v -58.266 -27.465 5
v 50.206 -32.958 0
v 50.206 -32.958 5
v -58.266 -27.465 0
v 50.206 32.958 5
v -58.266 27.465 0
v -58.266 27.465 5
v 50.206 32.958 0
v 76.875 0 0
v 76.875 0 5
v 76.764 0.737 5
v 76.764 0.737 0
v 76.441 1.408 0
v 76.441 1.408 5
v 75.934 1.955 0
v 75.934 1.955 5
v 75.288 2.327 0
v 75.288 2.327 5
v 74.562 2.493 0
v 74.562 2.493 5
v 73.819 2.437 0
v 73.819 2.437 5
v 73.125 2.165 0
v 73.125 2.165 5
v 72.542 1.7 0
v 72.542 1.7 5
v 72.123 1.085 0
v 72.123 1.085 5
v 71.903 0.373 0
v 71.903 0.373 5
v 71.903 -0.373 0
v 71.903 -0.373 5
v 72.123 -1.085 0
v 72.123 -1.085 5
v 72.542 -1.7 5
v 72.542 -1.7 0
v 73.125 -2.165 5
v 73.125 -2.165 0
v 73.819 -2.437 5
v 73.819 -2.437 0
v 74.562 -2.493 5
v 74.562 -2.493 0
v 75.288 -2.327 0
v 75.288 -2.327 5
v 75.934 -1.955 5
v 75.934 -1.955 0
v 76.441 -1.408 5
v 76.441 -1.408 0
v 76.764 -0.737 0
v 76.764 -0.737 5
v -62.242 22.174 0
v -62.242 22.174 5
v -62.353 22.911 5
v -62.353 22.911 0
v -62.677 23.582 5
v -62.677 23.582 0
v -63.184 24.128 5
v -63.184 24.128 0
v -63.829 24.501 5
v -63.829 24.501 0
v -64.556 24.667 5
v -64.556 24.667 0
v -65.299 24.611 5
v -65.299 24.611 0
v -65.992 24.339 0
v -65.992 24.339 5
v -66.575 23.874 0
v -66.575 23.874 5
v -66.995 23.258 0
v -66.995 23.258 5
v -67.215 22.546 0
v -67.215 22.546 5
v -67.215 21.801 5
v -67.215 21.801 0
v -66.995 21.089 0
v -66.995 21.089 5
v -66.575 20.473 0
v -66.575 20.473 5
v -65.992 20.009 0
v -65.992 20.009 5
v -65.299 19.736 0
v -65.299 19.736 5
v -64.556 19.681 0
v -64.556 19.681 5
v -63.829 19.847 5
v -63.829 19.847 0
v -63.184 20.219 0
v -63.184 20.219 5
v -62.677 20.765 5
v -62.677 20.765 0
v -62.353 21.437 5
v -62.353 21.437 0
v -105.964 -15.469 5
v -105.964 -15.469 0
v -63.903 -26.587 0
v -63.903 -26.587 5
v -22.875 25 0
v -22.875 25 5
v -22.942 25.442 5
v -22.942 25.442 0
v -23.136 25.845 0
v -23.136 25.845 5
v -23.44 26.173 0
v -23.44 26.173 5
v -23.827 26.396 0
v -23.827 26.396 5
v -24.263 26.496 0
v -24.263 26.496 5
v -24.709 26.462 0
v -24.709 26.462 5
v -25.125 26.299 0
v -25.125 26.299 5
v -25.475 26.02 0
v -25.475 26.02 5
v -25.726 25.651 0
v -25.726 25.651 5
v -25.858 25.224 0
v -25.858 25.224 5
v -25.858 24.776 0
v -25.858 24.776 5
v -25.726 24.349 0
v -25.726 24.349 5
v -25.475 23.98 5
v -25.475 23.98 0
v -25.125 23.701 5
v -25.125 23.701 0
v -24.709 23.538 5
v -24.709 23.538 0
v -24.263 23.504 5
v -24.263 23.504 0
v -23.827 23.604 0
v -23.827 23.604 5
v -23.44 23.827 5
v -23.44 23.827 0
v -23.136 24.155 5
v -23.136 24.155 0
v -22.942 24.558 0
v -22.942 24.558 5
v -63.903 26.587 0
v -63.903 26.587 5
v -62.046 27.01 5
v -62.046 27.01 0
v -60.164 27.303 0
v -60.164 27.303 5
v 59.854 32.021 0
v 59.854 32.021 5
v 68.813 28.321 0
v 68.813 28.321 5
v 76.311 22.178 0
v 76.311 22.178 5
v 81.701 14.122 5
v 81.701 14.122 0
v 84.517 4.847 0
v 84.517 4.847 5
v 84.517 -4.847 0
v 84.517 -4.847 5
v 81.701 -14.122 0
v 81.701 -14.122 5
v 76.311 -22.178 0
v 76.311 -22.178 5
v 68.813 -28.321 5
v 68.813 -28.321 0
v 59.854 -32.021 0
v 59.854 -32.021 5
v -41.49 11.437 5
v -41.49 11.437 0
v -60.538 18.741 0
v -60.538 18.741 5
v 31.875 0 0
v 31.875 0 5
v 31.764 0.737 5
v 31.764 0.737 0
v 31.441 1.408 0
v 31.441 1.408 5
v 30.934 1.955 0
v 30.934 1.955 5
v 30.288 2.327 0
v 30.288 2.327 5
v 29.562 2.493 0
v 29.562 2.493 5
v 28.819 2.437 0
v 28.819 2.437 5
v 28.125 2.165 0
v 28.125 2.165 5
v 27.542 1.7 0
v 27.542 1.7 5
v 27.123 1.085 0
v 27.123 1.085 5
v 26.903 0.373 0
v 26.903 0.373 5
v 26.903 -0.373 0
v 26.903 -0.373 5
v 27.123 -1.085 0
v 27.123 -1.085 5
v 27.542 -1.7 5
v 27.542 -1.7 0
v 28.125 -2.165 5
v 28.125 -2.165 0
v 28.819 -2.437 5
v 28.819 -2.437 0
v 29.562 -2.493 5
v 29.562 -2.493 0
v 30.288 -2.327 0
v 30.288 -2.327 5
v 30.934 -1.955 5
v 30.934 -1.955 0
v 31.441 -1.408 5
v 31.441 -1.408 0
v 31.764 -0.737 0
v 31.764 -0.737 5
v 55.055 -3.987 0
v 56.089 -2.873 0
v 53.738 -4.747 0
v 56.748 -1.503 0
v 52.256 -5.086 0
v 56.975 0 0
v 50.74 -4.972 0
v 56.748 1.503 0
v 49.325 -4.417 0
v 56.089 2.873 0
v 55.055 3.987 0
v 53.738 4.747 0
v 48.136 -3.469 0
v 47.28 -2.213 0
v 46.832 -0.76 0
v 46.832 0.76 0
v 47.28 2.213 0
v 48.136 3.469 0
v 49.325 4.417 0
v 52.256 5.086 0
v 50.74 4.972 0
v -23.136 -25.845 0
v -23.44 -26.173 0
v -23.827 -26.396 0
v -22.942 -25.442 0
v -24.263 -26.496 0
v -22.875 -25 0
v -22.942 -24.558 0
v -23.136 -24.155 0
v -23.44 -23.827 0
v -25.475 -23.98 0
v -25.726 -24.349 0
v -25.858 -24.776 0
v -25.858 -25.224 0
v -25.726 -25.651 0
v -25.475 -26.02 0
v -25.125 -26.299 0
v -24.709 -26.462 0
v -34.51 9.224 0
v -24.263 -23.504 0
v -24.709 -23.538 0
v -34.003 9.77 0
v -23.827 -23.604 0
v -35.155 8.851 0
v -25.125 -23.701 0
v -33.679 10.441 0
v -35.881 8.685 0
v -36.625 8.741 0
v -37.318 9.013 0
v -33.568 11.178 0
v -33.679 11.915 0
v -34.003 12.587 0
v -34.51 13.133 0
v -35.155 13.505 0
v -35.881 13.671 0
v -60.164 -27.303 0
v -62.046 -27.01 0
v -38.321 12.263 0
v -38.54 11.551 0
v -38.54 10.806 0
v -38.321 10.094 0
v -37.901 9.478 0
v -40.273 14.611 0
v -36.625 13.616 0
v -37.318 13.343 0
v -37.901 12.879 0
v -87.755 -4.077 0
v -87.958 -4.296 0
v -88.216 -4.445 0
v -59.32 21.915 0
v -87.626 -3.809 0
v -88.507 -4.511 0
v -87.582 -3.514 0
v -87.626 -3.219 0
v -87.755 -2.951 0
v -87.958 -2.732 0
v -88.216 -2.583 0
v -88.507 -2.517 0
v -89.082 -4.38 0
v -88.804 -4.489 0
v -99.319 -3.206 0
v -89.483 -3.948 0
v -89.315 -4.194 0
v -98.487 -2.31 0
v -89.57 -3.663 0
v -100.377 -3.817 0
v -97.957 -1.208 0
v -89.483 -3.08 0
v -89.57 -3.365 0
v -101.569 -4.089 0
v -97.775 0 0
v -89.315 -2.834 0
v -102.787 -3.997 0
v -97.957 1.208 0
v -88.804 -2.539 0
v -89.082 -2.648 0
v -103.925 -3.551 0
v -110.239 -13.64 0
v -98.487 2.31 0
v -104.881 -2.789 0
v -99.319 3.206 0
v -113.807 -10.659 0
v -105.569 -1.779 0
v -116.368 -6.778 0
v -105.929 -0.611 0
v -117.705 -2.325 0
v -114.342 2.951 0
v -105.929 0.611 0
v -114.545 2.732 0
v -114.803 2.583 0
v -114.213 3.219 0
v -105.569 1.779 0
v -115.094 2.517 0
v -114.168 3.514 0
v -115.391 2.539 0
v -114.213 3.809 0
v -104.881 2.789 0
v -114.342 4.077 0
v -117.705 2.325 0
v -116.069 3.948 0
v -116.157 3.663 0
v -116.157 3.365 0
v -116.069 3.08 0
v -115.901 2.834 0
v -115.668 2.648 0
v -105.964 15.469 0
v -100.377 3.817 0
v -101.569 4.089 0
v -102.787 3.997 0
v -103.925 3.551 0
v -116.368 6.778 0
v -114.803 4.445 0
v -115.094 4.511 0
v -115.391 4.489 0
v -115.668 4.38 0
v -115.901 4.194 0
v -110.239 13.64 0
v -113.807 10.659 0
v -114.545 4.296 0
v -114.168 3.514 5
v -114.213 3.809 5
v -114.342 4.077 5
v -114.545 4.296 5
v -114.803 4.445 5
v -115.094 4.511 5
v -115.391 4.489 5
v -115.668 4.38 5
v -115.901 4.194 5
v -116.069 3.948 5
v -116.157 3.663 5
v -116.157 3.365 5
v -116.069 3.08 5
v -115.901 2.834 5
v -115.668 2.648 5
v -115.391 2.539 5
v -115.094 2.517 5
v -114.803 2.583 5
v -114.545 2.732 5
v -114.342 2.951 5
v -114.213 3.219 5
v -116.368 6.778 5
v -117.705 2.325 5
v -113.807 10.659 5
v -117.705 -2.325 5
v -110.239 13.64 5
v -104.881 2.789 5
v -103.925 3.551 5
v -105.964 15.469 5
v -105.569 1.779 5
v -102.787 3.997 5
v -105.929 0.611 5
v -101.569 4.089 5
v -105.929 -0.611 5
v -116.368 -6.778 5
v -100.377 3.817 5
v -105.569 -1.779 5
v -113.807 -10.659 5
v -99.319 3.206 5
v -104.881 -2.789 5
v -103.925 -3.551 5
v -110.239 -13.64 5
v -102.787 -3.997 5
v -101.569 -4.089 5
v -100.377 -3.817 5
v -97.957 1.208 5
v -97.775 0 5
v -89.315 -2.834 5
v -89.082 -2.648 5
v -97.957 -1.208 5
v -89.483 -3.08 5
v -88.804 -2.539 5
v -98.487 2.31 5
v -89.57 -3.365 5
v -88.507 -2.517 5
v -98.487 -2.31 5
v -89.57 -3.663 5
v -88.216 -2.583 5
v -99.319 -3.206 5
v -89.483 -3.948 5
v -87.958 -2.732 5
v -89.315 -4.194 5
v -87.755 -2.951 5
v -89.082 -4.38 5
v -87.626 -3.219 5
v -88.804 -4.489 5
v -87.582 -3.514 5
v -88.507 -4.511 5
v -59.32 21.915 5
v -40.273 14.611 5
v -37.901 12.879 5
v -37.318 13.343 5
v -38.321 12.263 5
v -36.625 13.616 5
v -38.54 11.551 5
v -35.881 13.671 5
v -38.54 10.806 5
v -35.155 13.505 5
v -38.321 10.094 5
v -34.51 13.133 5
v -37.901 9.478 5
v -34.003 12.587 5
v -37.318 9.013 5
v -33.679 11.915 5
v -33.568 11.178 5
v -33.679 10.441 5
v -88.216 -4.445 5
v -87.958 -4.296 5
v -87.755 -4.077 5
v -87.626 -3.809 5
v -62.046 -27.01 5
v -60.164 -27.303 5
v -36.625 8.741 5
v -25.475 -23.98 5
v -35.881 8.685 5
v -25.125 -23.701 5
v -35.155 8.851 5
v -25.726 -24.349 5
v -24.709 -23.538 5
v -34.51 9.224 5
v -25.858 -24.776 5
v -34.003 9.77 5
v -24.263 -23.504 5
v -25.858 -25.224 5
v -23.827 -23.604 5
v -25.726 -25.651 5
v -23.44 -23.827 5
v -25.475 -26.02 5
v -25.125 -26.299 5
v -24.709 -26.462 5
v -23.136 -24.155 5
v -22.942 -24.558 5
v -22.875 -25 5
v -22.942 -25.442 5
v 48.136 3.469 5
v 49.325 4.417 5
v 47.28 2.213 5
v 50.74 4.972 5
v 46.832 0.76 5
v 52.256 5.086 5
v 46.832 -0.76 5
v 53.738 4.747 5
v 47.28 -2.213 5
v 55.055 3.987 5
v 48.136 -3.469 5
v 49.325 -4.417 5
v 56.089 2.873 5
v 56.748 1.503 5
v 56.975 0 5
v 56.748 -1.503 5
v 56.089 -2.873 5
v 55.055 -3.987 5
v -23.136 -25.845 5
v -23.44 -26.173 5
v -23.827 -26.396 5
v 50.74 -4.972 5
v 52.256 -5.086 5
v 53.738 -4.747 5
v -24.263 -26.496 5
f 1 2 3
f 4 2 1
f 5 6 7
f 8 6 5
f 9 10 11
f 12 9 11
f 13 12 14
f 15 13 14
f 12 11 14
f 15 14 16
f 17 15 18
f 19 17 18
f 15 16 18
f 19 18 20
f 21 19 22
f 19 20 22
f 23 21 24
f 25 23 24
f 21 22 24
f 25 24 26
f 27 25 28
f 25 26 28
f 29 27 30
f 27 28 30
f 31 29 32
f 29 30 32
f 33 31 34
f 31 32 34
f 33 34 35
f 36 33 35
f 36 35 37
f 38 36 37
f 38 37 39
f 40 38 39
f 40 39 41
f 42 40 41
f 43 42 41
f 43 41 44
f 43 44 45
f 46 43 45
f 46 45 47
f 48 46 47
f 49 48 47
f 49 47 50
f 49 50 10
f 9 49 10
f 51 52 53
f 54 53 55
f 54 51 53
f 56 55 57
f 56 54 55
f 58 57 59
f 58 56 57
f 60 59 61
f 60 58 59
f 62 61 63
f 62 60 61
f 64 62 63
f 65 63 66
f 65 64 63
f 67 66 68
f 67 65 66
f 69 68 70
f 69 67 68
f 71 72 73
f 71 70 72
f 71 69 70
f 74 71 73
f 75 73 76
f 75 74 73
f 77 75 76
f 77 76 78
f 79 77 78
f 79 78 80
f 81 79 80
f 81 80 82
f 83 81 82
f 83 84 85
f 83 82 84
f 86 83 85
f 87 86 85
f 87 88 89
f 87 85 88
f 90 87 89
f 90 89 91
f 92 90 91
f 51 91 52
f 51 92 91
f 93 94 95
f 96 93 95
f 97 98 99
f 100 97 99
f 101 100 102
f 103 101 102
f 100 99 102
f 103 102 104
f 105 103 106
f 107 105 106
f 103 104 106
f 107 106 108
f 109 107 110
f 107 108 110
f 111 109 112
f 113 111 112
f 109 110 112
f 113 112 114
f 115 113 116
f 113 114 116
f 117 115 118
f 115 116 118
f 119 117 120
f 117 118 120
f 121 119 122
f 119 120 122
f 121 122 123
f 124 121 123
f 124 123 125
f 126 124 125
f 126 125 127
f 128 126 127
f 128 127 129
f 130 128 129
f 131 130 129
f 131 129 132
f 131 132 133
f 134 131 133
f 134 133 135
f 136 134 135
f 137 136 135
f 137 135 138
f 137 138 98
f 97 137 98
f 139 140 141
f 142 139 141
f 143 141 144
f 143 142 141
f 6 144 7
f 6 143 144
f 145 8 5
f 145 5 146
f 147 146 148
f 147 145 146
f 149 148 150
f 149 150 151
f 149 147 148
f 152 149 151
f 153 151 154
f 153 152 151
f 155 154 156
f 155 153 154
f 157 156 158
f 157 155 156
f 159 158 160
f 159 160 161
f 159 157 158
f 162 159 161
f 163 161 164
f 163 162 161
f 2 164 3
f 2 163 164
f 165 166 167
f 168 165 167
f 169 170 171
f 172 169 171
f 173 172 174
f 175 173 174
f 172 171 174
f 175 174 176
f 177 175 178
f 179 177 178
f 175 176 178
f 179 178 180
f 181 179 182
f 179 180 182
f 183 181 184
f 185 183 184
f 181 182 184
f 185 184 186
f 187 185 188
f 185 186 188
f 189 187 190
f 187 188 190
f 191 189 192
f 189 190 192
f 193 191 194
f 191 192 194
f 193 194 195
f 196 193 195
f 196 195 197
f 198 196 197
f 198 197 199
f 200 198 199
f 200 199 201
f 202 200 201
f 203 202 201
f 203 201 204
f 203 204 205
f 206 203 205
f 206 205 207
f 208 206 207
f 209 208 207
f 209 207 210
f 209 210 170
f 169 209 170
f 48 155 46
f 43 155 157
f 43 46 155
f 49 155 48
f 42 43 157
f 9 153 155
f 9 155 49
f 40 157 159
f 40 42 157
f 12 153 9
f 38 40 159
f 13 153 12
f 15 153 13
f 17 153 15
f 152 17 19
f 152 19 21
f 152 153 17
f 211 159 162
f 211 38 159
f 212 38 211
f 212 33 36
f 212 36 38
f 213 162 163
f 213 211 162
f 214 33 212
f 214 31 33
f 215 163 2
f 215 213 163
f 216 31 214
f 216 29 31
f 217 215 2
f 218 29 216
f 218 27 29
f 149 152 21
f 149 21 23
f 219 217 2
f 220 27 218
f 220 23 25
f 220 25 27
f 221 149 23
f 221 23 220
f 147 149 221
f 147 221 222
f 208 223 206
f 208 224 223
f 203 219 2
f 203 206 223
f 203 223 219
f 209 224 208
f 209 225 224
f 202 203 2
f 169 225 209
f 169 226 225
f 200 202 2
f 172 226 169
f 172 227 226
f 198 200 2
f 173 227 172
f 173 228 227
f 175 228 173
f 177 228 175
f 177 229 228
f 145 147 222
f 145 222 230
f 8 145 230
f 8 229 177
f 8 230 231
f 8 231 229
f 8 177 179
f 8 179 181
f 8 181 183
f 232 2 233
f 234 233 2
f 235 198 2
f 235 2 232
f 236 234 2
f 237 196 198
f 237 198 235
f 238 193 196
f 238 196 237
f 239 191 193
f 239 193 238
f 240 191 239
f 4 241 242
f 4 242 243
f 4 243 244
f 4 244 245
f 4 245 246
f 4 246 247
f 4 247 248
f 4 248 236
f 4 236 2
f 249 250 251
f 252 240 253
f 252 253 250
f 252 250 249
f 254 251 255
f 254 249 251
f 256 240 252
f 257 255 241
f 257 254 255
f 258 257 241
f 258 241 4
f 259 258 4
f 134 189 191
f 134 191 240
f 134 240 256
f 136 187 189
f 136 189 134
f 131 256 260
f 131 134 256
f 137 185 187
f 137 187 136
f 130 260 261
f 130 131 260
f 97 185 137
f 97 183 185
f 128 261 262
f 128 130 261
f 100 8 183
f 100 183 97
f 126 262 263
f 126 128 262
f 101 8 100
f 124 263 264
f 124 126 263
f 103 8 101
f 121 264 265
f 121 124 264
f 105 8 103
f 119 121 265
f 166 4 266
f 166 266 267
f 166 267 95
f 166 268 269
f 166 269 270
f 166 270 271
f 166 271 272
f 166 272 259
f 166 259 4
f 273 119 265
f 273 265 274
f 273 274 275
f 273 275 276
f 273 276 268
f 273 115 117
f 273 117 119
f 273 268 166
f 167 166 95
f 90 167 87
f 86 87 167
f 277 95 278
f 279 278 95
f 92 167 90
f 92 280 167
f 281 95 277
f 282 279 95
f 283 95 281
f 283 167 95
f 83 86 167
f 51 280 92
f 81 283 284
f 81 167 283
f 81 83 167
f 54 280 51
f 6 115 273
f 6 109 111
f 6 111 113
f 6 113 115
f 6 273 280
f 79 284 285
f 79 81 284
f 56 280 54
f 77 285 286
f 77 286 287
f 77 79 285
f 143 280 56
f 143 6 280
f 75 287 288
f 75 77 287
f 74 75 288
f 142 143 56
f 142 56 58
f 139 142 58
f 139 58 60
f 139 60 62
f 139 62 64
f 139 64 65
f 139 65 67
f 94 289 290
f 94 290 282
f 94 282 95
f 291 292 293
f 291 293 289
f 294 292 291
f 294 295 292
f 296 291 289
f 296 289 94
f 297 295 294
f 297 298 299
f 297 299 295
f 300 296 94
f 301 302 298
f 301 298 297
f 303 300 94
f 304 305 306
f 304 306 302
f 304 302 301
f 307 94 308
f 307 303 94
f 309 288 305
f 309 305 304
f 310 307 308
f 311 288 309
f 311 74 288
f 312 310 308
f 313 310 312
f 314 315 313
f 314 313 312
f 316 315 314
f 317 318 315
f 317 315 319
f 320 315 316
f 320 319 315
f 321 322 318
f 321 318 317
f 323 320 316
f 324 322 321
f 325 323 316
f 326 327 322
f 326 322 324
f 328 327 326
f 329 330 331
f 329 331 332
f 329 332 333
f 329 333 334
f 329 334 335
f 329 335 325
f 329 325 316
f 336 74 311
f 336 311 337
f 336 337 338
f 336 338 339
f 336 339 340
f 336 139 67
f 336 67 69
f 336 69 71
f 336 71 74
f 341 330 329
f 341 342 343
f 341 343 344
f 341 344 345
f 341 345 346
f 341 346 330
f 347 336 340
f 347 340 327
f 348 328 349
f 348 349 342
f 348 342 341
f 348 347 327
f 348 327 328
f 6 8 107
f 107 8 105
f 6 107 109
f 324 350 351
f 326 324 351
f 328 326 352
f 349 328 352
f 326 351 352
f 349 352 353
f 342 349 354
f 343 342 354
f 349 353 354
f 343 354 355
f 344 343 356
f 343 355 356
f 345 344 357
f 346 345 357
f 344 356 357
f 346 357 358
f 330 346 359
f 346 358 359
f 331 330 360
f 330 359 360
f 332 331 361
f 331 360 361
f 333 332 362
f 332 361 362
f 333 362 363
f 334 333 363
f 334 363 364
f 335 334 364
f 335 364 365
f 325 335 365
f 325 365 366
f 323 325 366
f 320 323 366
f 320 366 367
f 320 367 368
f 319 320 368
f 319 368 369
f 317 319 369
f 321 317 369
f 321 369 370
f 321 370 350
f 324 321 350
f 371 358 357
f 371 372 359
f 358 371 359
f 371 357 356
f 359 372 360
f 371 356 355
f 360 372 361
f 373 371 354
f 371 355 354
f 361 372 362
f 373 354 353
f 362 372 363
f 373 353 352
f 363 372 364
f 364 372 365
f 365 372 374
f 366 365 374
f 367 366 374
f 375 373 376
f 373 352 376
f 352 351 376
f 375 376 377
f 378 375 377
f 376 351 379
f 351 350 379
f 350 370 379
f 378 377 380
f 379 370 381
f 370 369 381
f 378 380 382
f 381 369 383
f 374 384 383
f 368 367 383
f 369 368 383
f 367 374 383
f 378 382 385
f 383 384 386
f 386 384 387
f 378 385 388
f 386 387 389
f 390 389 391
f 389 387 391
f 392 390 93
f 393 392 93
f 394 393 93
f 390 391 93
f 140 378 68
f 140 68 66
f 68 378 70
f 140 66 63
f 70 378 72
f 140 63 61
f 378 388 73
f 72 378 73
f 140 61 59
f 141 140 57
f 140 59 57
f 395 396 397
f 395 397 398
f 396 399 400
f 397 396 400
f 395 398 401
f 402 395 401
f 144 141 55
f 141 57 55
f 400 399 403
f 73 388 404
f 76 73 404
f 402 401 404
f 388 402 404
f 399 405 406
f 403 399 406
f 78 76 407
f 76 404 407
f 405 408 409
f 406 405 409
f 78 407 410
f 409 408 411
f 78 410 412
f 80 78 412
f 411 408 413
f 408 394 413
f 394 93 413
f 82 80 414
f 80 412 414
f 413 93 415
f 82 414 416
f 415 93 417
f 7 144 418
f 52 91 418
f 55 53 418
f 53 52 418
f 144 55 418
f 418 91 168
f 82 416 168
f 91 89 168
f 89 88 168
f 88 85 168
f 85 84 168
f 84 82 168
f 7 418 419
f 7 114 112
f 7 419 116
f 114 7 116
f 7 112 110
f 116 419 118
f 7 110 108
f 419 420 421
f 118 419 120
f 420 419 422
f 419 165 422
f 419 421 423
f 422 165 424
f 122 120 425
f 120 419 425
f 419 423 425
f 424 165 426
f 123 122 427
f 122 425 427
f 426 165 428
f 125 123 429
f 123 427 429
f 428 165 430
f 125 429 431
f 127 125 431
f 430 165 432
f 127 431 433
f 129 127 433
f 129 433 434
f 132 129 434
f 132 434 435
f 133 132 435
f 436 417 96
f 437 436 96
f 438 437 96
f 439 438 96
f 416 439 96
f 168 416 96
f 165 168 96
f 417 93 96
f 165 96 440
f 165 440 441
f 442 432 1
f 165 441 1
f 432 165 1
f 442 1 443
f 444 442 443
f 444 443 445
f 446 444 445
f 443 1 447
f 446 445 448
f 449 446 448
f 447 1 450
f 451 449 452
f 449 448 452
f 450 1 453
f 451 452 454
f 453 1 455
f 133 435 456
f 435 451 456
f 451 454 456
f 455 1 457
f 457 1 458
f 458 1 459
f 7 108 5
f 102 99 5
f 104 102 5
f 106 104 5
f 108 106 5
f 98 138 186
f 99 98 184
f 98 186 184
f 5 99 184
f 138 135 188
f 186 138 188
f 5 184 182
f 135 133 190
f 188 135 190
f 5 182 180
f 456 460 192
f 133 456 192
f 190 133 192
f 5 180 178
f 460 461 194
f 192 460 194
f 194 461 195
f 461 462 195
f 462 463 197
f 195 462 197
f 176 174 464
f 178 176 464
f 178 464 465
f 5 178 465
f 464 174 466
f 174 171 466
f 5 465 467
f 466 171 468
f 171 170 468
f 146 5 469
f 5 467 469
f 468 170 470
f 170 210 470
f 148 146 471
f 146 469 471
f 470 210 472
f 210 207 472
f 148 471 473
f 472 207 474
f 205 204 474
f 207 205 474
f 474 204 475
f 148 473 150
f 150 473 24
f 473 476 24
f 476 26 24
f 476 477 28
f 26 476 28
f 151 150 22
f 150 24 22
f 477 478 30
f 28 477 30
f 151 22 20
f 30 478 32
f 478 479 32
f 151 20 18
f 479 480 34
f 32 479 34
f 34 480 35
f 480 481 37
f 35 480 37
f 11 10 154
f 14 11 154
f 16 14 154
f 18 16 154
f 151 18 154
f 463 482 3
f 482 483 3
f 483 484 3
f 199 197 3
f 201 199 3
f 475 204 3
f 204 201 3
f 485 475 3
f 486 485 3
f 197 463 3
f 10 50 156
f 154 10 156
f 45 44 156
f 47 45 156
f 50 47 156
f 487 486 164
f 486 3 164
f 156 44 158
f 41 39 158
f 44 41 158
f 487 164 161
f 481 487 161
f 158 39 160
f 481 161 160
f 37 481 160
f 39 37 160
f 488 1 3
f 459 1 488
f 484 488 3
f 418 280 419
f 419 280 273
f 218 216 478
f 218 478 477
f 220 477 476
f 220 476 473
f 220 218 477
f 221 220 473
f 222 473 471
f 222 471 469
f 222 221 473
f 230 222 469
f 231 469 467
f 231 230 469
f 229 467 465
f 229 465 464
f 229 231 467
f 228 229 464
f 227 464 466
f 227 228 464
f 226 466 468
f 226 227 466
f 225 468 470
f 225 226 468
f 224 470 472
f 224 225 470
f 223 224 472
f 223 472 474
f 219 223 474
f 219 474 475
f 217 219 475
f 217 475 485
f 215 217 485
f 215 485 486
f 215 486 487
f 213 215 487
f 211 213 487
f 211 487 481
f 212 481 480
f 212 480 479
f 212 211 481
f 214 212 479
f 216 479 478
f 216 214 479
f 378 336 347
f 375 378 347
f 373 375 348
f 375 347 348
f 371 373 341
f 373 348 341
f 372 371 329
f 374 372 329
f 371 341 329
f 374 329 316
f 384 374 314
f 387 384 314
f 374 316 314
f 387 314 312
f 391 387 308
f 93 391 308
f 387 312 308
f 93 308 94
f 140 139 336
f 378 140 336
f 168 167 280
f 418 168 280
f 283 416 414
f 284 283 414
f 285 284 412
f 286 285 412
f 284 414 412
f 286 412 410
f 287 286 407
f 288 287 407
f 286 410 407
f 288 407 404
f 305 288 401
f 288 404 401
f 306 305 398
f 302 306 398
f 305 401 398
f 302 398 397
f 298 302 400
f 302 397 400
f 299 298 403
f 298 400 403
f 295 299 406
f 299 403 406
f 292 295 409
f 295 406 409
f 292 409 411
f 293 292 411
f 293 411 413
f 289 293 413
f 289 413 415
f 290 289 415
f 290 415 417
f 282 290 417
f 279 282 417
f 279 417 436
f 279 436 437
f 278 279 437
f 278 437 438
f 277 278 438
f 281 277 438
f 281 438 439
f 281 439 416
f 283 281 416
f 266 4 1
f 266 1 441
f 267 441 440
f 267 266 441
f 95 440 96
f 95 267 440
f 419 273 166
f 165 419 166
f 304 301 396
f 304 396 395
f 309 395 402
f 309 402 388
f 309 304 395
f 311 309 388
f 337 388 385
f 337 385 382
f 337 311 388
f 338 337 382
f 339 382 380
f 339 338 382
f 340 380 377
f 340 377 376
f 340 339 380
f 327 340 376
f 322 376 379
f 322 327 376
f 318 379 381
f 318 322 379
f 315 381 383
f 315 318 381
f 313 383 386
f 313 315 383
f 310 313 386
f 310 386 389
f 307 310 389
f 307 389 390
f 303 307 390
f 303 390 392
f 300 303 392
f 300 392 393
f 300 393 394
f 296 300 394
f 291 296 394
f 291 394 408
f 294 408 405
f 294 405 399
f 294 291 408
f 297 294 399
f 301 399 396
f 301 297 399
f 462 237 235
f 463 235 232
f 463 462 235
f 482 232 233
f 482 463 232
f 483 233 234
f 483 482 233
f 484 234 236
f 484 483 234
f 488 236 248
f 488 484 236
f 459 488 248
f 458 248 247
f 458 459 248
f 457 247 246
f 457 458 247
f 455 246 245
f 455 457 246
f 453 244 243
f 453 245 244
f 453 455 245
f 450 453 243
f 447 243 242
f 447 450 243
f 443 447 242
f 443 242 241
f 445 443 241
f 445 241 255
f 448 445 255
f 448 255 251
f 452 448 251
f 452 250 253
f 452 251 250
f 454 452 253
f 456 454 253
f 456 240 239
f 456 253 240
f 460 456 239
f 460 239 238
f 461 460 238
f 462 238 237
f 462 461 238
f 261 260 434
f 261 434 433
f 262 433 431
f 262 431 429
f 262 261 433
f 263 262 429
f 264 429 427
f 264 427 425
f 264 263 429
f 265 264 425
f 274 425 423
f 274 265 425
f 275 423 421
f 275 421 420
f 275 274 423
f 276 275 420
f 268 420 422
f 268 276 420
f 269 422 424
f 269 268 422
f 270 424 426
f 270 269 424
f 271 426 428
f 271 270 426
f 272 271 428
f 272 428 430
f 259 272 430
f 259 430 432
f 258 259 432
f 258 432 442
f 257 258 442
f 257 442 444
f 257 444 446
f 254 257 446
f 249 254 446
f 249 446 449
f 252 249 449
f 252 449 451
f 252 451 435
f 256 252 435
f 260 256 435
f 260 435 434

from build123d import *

# Parameters (mm, degrees)
SKETCH1_R           = 16
SKETCH1_R_2         = 4.1
SKETCH1_R_3         = 5.1
BOSS_EXTRUDE1_DEPTH = 5
SKETCH7_R           = 2.5
CUT_EXTRUDE1_DEPTH  = 7
BOSS_EXTRUDE6_DEPTH = 8
SKETCH9_R           = 1.5
CUT_EXTRUDE2_DEPTH  = 6
SKETCH10_R          = 2.5
BOSS_EXTRUDE7_DEPTH = 5
CUT_EXTRUDE4_START  = -10
SKETCH12_R          = 2.5
CUT_EXTRUDE4_DEPTH  = 10
SKETCH11_R          = 1
CUT_EXTRUDE3_DEPTH  = 6
CUT_EXTRUDE5_START  = 5
CUT_EXTRUDE5_DEPTH  = 5


with BuildPart() as part:
    # Sketch1 → Boss-Extrude1 (new body)
    # profile 1 of 3: a face of its own
    with BuildSketch(Plane.XY):
        with BuildLine():
            ThreePointArc((-63.902777778, -26.586845234), (-84.375, 0), (-63.902777778, 26.586845234))
            Line((-63.902777778, 26.586845234), (-105.963888889, 15.468709954))
            ThreePointArc((-105.963888889, 15.468709954), (-92.113397217, 12.677188612), (-85.875, 0))
            ThreePointArc((-85.875, 0), (-92.113397217, -12.677188612), (-105.963888889, -15.468709954))
            Line((-105.963888889, -15.468709954), (-63.902777778, -26.586845234))
        make_face()
    # profile 2 of 3: a face of its own
    with BuildSketch(Plane.XY):
        with Locations((-101.875, 0)):
            Circle(SKETCH1_R)
        with Locations((-101.875, 0)):
            Circle(SKETCH1_R_2, mode=Mode.SUBTRACT)
    # profile 3 of 3: a face of its own
    with BuildSketch(Plane.XY):
        with BuildLine():
            Line((-58.265804598, 27.46480771), (50.206034483, 32.957769253))
            ThreePointArc((50.206034483, 32.957769253), (84.875, 0), (50.206034483, -32.957769253))
            Line((50.206034483, -32.957769253), (-58.265804598, -27.46480771))
            ThreePointArc((-58.265804598, -27.46480771), (-84.375, 0), (-58.265804598, 27.46480771))
        make_face()
        with Locations((51.875, 0)):
            Circle(SKETCH1_R_3, mode=Mode.SUBTRACT)
    extrude(amount=BOSS_EXTRUDE1_DEPTH)

    # Sketch7 → Cut-Extrude1 (cut)
    with BuildSketch(Plane.XY.offset(5)):
        with Locations((29.375, 0)):
            Circle(SKETCH7_R)
        with Locations((74.375, 0)):
            Circle(SKETCH7_R)
    extrude(amount=-CUT_EXTRUDE1_DEPTH, mode=Mode.SUBTRACT)

    # Sketch8 → Boss-Extrude6 (add)
    with BuildSketch(Plane.XY.offset(5)):
        Polygon((-26.375, 28.464101615), (-28.375, 25), (-26.375, 21.535898385), (-22.375, 21.535898385), (-20.375, 25), (-22.375, 28.464101615), align=None)
        Polygon((-25.991580754, 27.8), (-27.608161507, 25), (-25.991580754, 22.2), (-22.758419246, 22.2), (-21.141838493, 25), (-22.758419246, 27.8), align=None, mode=Mode.SUBTRACT)
    boss_extrude6 = extrude(amount=-BOSS_EXTRUDE6_DEPTH)

    # Sketch9 → Cut-Extrude2 (cut)
    with BuildSketch(Plane.XY.offset(5)):
        with Locations((-24.375, 25)):
            Circle(SKETCH9_R)
    cut_extrude2 = extrude(amount=-CUT_EXTRUDE2_DEPTH, mode=Mode.SUBTRACT)

    # Mirror1: Boss-Extrude6 across plane
    add(boss_extrude6.mirror(Plane.ZX))

    # Mirror2: Cut-Extrude2 across plane
    add(cut_extrude2.mirror(Plane.ZX), mode=Mode.SUBTRACT)

    # Sketch10 → Boss-Extrude7 (add)
    with BuildSketch(Plane.XY.offset(5)):
        with Locations((-36.06831441, 11.178241177)):
            Circle(SKETCH10_R)
        with Locations(Location((-64.742423683, 22.173717984, 0), (0, 0, 180))):
            Circle(SKETCH10_R)
        Polygon((-41.60537748, 11.695000918), (-60.279486753, 18.855841852), (-59.205360613, 21.656958243), (-40.53125134, 14.496117309), align=None)
    extrude(amount=BOSS_EXTRUDE7_DEPTH)

    # Sketch12 → Cut-Extrude4 (cut)
    with BuildSketch(Plane.XY.offset(10).offset(CUT_EXTRUDE4_START)):
        with Locations((-36.06831441, 11.178241177)):
            Circle(SKETCH12_R)
        with Locations((-64.742423683, 22.173717984)):
            Circle(SKETCH12_R)
        Polygon((-59.320493296, 21.915307745), (-40.272901838, 14.611249993), (-41.490244797, 11.436651416), (-60.537836255, 18.740709168), align=None)
    extrude(amount=CUT_EXTRUDE4_DEPTH, mode=Mode.SUBTRACT)

    # Sketch11 → Cut-Extrude3 (cut)
    with BuildSketch(Plane.XY.offset(5)):
        with Locations((-88.581577383, -3.513888889)):
            Circle(SKETCH11_R)
        with Locations((-115.168422617, 3.513888889)):
            Circle(SKETCH11_R)
    extrude(amount=-CUT_EXTRUDE3_DEPTH, mode=Mode.SUBTRACT)

    # Sketch13 → Cut-Extrude5 (cut)
    with BuildSketch(Plane(origin=(0, 0, 0), x_dir=(-1, 0, 0), z_dir=(0, 0, -1)).offset(CUT_EXTRUDE5_START)):
        with BuildLine():
            Line((105.963888889, 15.468709954), (63.902777778, 26.586845234))
            ThreePointArc((63.902777778, 26.586845234), (61.107119662, 27.172397082), (58.265804598, 27.46480771))
            Line((58.265804598, 27.46480771), (-50.206034483, 32.957769253))
            ThreePointArc((-50.206034483, 32.957769253), (-84.875, 0), (-50.206034483, -32.957769253))
            Line((-50.206034483, -32.957769253), (58.265804598, -27.46480771))
            ThreePointArc((58.265804598, -27.46480771), (61.107119662, -27.172397082), (63.902777778, -26.586845234))
            Line((63.902777778, -26.586845234), (105.963888889, -15.468709954))
            ThreePointArc((105.963888889, -15.468709954), (117.875, 0), (105.963888889, 15.468709954))
        make_face()
    extrude(amount=-CUT_EXTRUDE5_DEPTH, mode=Mode.SUBTRACT)


solid = part.part
